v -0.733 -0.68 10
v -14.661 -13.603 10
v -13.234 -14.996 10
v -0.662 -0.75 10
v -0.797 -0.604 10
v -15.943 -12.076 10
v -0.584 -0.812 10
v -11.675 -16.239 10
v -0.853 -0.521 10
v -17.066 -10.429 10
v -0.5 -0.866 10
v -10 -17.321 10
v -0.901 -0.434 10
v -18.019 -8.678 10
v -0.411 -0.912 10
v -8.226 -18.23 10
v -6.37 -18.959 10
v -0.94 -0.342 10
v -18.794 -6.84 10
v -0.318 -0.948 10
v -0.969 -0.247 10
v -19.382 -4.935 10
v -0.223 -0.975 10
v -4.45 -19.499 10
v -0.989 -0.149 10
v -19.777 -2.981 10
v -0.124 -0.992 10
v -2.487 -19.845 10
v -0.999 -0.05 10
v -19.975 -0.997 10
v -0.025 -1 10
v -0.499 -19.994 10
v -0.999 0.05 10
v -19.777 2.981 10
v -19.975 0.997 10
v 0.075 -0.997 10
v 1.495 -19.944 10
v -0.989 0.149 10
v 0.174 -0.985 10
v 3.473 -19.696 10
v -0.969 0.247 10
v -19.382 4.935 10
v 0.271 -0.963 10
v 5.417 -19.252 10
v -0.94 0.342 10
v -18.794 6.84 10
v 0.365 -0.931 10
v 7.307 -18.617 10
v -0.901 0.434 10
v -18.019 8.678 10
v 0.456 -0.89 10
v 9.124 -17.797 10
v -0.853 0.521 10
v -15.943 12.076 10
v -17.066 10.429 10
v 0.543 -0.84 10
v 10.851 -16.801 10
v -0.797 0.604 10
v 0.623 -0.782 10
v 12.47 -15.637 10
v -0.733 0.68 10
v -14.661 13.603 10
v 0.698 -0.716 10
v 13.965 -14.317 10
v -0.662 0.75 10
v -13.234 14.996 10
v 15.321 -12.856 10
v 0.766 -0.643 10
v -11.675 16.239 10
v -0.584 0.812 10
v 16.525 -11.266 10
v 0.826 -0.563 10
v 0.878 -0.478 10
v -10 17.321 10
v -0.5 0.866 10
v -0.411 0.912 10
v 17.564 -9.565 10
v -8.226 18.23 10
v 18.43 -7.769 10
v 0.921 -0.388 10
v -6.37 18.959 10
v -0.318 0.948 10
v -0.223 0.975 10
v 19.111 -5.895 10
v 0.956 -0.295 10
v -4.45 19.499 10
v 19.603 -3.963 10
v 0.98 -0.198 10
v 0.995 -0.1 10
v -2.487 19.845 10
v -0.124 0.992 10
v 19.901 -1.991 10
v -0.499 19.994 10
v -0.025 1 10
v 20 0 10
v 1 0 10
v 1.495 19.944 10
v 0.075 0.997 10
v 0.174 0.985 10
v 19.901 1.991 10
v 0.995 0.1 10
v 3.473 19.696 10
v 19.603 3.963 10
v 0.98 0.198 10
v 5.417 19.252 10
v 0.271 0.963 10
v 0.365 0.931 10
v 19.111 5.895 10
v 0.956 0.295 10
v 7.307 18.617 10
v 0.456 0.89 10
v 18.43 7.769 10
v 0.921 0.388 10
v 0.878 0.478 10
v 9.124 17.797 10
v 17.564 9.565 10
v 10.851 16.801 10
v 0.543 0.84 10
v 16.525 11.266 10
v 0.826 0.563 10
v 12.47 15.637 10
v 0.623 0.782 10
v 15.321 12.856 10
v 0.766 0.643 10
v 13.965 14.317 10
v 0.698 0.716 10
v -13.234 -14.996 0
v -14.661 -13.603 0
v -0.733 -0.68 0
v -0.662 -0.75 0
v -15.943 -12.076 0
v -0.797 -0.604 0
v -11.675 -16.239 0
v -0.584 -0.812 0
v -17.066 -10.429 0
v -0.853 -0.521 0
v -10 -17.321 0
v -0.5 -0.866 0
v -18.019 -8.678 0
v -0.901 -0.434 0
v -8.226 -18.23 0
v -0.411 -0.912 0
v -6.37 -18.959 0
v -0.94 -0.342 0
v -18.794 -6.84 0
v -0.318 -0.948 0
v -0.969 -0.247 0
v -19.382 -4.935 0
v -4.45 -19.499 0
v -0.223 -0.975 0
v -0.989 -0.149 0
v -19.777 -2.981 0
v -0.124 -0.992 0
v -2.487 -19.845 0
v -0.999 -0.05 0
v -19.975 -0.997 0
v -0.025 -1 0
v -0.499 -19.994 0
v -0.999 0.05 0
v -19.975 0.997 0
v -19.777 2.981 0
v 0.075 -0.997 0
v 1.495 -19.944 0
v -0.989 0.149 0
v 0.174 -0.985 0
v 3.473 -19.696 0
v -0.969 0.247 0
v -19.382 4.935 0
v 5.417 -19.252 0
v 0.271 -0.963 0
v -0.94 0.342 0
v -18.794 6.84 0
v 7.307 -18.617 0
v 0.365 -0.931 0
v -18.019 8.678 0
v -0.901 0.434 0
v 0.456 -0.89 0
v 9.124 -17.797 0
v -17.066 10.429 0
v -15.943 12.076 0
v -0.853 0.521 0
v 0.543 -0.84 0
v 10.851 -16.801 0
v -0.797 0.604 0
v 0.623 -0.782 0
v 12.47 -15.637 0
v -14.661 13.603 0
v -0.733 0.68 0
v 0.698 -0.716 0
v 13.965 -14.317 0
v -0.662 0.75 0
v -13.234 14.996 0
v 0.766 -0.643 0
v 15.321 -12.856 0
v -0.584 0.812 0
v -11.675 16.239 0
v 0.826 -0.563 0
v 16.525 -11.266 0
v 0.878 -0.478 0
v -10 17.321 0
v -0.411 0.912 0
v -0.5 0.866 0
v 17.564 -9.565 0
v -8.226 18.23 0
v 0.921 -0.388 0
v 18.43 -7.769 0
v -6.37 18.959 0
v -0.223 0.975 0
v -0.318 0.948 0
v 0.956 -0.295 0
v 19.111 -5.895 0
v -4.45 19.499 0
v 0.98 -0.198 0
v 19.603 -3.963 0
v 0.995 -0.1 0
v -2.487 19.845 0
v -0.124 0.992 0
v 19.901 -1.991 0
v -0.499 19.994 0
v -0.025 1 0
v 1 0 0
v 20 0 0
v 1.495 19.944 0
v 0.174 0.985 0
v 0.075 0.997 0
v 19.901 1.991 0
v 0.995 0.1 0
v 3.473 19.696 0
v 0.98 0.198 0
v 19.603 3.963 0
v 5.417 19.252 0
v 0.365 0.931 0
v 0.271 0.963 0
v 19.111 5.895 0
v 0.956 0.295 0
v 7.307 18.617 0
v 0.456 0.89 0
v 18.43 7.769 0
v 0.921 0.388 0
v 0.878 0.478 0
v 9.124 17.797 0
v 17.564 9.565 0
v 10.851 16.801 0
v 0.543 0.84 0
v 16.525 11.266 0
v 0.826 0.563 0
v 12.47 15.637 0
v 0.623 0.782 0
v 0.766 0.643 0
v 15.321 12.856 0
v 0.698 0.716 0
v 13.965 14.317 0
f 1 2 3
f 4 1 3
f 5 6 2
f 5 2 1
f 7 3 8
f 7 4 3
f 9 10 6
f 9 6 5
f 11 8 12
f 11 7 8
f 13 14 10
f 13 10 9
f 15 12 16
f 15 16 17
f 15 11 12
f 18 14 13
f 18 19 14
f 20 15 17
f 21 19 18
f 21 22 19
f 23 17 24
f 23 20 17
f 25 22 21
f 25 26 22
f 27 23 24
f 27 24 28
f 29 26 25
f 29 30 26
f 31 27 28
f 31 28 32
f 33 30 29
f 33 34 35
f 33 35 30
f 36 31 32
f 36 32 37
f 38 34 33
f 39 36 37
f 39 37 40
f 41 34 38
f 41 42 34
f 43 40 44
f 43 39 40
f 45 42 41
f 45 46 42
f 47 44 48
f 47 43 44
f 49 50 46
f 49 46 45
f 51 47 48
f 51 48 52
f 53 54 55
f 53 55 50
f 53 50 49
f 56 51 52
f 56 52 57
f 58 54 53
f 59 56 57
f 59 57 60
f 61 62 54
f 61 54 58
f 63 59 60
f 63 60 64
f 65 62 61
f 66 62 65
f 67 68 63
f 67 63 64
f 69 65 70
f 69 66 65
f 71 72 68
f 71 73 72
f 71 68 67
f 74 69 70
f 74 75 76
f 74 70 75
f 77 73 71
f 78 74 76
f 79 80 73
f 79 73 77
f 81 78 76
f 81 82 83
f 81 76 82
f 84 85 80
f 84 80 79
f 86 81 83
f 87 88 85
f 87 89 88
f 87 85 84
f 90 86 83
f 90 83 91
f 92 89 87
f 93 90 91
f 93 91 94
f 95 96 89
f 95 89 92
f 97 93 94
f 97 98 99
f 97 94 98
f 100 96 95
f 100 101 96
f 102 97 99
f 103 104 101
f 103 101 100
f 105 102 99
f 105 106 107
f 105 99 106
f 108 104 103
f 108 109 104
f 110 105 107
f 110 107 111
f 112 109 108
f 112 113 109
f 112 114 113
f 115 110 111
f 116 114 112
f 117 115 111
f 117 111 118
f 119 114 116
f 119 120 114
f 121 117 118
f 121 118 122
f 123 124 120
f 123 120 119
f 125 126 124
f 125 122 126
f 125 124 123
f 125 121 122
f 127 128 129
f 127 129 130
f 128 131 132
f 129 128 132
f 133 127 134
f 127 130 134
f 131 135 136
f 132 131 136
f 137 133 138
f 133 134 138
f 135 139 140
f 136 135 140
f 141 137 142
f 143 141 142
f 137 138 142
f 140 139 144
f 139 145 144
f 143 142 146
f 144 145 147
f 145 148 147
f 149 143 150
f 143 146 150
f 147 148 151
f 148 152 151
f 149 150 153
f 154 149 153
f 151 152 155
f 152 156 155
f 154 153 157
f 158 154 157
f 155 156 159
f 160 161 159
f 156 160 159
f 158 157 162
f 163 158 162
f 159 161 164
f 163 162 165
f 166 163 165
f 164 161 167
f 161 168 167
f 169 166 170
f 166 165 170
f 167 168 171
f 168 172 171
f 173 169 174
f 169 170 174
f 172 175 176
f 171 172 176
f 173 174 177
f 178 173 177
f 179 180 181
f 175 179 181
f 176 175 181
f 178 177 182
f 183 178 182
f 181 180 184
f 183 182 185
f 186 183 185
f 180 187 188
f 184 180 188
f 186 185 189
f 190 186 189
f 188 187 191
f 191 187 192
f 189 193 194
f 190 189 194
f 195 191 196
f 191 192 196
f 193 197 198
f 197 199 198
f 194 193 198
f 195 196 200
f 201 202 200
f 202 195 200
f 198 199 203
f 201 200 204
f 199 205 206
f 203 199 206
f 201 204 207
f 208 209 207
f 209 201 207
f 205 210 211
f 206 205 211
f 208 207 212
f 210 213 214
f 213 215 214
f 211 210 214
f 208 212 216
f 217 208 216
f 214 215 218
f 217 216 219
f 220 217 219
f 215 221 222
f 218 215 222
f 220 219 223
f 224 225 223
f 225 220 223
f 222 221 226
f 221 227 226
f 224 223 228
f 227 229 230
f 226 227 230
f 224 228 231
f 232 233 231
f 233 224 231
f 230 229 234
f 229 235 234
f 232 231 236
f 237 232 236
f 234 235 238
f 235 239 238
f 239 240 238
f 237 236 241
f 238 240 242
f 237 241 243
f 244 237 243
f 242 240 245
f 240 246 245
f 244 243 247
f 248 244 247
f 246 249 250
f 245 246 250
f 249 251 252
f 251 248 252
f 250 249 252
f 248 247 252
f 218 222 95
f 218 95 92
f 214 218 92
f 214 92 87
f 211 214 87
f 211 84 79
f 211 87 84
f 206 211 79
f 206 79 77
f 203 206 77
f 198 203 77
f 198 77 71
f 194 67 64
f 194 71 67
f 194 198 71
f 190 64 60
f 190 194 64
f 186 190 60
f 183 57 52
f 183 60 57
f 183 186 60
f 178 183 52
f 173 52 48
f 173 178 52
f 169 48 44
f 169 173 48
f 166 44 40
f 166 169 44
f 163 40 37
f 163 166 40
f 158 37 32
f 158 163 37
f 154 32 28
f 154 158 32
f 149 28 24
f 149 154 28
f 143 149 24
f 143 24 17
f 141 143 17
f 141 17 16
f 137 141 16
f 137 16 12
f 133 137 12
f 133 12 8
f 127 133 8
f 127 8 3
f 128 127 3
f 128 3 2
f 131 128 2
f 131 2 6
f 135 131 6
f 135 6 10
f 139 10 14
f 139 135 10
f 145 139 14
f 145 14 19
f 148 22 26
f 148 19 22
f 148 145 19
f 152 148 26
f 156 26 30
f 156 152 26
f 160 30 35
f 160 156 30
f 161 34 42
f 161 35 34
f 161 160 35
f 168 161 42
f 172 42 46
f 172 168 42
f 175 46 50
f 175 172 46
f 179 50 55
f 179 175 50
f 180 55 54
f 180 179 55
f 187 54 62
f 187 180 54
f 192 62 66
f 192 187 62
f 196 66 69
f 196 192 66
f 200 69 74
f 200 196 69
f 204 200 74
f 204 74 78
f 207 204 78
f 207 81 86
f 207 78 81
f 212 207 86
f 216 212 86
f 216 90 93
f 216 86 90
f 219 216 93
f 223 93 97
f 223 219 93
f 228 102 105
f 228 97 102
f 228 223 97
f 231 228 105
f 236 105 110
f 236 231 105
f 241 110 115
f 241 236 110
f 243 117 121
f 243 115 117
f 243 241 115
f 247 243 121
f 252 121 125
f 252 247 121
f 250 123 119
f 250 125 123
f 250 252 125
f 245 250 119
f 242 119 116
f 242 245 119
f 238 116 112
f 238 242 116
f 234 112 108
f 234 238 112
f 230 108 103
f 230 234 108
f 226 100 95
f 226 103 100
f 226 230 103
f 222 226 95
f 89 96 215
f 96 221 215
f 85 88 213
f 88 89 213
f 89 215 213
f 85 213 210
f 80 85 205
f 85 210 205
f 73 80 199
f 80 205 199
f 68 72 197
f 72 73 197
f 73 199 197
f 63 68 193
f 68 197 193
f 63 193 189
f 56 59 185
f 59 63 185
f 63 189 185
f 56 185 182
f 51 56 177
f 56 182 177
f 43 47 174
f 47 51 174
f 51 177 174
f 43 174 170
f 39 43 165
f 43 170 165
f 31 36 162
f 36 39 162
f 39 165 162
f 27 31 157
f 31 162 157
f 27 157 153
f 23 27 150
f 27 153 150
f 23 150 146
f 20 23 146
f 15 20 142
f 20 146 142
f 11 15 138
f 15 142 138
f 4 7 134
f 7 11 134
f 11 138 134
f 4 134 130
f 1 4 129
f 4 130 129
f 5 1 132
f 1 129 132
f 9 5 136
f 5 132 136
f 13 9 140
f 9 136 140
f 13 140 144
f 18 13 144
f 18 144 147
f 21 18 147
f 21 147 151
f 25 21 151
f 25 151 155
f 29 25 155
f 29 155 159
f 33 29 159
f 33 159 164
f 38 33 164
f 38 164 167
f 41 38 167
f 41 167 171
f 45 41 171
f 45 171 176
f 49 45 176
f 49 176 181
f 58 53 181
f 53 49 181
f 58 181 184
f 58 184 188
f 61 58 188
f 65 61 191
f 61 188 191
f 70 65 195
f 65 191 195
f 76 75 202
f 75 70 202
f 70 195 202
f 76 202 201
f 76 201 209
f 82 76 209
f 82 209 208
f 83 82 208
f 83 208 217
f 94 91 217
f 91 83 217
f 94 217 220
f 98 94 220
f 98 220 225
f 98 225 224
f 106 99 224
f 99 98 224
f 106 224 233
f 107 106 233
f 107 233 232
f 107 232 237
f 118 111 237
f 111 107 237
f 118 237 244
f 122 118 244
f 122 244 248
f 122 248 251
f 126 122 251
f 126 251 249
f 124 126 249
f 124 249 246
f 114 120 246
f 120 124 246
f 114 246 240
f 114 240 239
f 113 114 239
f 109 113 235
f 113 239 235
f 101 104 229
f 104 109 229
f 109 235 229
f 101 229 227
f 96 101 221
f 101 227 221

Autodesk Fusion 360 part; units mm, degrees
sketch "Sketch2" plane through (0, 0, 0) normal (0, 0, 1) x (1, 0, 0)
  circle A0 centre (0, 0) radius 20
  circle A1 centre (0, 0) radius 1
  dimension "d22" = 40
extrude "Extrude1" add sketch "Sketch2" along normal blind 10 makes body 1
copy_body "Body->Comp1" bodies 1 removing the originals makes body 2 in component "Component"
component "Component" placed x (1, 0, 0) y (0, 1, 0) z (0, 0, 1) at (0, 0, 0)
